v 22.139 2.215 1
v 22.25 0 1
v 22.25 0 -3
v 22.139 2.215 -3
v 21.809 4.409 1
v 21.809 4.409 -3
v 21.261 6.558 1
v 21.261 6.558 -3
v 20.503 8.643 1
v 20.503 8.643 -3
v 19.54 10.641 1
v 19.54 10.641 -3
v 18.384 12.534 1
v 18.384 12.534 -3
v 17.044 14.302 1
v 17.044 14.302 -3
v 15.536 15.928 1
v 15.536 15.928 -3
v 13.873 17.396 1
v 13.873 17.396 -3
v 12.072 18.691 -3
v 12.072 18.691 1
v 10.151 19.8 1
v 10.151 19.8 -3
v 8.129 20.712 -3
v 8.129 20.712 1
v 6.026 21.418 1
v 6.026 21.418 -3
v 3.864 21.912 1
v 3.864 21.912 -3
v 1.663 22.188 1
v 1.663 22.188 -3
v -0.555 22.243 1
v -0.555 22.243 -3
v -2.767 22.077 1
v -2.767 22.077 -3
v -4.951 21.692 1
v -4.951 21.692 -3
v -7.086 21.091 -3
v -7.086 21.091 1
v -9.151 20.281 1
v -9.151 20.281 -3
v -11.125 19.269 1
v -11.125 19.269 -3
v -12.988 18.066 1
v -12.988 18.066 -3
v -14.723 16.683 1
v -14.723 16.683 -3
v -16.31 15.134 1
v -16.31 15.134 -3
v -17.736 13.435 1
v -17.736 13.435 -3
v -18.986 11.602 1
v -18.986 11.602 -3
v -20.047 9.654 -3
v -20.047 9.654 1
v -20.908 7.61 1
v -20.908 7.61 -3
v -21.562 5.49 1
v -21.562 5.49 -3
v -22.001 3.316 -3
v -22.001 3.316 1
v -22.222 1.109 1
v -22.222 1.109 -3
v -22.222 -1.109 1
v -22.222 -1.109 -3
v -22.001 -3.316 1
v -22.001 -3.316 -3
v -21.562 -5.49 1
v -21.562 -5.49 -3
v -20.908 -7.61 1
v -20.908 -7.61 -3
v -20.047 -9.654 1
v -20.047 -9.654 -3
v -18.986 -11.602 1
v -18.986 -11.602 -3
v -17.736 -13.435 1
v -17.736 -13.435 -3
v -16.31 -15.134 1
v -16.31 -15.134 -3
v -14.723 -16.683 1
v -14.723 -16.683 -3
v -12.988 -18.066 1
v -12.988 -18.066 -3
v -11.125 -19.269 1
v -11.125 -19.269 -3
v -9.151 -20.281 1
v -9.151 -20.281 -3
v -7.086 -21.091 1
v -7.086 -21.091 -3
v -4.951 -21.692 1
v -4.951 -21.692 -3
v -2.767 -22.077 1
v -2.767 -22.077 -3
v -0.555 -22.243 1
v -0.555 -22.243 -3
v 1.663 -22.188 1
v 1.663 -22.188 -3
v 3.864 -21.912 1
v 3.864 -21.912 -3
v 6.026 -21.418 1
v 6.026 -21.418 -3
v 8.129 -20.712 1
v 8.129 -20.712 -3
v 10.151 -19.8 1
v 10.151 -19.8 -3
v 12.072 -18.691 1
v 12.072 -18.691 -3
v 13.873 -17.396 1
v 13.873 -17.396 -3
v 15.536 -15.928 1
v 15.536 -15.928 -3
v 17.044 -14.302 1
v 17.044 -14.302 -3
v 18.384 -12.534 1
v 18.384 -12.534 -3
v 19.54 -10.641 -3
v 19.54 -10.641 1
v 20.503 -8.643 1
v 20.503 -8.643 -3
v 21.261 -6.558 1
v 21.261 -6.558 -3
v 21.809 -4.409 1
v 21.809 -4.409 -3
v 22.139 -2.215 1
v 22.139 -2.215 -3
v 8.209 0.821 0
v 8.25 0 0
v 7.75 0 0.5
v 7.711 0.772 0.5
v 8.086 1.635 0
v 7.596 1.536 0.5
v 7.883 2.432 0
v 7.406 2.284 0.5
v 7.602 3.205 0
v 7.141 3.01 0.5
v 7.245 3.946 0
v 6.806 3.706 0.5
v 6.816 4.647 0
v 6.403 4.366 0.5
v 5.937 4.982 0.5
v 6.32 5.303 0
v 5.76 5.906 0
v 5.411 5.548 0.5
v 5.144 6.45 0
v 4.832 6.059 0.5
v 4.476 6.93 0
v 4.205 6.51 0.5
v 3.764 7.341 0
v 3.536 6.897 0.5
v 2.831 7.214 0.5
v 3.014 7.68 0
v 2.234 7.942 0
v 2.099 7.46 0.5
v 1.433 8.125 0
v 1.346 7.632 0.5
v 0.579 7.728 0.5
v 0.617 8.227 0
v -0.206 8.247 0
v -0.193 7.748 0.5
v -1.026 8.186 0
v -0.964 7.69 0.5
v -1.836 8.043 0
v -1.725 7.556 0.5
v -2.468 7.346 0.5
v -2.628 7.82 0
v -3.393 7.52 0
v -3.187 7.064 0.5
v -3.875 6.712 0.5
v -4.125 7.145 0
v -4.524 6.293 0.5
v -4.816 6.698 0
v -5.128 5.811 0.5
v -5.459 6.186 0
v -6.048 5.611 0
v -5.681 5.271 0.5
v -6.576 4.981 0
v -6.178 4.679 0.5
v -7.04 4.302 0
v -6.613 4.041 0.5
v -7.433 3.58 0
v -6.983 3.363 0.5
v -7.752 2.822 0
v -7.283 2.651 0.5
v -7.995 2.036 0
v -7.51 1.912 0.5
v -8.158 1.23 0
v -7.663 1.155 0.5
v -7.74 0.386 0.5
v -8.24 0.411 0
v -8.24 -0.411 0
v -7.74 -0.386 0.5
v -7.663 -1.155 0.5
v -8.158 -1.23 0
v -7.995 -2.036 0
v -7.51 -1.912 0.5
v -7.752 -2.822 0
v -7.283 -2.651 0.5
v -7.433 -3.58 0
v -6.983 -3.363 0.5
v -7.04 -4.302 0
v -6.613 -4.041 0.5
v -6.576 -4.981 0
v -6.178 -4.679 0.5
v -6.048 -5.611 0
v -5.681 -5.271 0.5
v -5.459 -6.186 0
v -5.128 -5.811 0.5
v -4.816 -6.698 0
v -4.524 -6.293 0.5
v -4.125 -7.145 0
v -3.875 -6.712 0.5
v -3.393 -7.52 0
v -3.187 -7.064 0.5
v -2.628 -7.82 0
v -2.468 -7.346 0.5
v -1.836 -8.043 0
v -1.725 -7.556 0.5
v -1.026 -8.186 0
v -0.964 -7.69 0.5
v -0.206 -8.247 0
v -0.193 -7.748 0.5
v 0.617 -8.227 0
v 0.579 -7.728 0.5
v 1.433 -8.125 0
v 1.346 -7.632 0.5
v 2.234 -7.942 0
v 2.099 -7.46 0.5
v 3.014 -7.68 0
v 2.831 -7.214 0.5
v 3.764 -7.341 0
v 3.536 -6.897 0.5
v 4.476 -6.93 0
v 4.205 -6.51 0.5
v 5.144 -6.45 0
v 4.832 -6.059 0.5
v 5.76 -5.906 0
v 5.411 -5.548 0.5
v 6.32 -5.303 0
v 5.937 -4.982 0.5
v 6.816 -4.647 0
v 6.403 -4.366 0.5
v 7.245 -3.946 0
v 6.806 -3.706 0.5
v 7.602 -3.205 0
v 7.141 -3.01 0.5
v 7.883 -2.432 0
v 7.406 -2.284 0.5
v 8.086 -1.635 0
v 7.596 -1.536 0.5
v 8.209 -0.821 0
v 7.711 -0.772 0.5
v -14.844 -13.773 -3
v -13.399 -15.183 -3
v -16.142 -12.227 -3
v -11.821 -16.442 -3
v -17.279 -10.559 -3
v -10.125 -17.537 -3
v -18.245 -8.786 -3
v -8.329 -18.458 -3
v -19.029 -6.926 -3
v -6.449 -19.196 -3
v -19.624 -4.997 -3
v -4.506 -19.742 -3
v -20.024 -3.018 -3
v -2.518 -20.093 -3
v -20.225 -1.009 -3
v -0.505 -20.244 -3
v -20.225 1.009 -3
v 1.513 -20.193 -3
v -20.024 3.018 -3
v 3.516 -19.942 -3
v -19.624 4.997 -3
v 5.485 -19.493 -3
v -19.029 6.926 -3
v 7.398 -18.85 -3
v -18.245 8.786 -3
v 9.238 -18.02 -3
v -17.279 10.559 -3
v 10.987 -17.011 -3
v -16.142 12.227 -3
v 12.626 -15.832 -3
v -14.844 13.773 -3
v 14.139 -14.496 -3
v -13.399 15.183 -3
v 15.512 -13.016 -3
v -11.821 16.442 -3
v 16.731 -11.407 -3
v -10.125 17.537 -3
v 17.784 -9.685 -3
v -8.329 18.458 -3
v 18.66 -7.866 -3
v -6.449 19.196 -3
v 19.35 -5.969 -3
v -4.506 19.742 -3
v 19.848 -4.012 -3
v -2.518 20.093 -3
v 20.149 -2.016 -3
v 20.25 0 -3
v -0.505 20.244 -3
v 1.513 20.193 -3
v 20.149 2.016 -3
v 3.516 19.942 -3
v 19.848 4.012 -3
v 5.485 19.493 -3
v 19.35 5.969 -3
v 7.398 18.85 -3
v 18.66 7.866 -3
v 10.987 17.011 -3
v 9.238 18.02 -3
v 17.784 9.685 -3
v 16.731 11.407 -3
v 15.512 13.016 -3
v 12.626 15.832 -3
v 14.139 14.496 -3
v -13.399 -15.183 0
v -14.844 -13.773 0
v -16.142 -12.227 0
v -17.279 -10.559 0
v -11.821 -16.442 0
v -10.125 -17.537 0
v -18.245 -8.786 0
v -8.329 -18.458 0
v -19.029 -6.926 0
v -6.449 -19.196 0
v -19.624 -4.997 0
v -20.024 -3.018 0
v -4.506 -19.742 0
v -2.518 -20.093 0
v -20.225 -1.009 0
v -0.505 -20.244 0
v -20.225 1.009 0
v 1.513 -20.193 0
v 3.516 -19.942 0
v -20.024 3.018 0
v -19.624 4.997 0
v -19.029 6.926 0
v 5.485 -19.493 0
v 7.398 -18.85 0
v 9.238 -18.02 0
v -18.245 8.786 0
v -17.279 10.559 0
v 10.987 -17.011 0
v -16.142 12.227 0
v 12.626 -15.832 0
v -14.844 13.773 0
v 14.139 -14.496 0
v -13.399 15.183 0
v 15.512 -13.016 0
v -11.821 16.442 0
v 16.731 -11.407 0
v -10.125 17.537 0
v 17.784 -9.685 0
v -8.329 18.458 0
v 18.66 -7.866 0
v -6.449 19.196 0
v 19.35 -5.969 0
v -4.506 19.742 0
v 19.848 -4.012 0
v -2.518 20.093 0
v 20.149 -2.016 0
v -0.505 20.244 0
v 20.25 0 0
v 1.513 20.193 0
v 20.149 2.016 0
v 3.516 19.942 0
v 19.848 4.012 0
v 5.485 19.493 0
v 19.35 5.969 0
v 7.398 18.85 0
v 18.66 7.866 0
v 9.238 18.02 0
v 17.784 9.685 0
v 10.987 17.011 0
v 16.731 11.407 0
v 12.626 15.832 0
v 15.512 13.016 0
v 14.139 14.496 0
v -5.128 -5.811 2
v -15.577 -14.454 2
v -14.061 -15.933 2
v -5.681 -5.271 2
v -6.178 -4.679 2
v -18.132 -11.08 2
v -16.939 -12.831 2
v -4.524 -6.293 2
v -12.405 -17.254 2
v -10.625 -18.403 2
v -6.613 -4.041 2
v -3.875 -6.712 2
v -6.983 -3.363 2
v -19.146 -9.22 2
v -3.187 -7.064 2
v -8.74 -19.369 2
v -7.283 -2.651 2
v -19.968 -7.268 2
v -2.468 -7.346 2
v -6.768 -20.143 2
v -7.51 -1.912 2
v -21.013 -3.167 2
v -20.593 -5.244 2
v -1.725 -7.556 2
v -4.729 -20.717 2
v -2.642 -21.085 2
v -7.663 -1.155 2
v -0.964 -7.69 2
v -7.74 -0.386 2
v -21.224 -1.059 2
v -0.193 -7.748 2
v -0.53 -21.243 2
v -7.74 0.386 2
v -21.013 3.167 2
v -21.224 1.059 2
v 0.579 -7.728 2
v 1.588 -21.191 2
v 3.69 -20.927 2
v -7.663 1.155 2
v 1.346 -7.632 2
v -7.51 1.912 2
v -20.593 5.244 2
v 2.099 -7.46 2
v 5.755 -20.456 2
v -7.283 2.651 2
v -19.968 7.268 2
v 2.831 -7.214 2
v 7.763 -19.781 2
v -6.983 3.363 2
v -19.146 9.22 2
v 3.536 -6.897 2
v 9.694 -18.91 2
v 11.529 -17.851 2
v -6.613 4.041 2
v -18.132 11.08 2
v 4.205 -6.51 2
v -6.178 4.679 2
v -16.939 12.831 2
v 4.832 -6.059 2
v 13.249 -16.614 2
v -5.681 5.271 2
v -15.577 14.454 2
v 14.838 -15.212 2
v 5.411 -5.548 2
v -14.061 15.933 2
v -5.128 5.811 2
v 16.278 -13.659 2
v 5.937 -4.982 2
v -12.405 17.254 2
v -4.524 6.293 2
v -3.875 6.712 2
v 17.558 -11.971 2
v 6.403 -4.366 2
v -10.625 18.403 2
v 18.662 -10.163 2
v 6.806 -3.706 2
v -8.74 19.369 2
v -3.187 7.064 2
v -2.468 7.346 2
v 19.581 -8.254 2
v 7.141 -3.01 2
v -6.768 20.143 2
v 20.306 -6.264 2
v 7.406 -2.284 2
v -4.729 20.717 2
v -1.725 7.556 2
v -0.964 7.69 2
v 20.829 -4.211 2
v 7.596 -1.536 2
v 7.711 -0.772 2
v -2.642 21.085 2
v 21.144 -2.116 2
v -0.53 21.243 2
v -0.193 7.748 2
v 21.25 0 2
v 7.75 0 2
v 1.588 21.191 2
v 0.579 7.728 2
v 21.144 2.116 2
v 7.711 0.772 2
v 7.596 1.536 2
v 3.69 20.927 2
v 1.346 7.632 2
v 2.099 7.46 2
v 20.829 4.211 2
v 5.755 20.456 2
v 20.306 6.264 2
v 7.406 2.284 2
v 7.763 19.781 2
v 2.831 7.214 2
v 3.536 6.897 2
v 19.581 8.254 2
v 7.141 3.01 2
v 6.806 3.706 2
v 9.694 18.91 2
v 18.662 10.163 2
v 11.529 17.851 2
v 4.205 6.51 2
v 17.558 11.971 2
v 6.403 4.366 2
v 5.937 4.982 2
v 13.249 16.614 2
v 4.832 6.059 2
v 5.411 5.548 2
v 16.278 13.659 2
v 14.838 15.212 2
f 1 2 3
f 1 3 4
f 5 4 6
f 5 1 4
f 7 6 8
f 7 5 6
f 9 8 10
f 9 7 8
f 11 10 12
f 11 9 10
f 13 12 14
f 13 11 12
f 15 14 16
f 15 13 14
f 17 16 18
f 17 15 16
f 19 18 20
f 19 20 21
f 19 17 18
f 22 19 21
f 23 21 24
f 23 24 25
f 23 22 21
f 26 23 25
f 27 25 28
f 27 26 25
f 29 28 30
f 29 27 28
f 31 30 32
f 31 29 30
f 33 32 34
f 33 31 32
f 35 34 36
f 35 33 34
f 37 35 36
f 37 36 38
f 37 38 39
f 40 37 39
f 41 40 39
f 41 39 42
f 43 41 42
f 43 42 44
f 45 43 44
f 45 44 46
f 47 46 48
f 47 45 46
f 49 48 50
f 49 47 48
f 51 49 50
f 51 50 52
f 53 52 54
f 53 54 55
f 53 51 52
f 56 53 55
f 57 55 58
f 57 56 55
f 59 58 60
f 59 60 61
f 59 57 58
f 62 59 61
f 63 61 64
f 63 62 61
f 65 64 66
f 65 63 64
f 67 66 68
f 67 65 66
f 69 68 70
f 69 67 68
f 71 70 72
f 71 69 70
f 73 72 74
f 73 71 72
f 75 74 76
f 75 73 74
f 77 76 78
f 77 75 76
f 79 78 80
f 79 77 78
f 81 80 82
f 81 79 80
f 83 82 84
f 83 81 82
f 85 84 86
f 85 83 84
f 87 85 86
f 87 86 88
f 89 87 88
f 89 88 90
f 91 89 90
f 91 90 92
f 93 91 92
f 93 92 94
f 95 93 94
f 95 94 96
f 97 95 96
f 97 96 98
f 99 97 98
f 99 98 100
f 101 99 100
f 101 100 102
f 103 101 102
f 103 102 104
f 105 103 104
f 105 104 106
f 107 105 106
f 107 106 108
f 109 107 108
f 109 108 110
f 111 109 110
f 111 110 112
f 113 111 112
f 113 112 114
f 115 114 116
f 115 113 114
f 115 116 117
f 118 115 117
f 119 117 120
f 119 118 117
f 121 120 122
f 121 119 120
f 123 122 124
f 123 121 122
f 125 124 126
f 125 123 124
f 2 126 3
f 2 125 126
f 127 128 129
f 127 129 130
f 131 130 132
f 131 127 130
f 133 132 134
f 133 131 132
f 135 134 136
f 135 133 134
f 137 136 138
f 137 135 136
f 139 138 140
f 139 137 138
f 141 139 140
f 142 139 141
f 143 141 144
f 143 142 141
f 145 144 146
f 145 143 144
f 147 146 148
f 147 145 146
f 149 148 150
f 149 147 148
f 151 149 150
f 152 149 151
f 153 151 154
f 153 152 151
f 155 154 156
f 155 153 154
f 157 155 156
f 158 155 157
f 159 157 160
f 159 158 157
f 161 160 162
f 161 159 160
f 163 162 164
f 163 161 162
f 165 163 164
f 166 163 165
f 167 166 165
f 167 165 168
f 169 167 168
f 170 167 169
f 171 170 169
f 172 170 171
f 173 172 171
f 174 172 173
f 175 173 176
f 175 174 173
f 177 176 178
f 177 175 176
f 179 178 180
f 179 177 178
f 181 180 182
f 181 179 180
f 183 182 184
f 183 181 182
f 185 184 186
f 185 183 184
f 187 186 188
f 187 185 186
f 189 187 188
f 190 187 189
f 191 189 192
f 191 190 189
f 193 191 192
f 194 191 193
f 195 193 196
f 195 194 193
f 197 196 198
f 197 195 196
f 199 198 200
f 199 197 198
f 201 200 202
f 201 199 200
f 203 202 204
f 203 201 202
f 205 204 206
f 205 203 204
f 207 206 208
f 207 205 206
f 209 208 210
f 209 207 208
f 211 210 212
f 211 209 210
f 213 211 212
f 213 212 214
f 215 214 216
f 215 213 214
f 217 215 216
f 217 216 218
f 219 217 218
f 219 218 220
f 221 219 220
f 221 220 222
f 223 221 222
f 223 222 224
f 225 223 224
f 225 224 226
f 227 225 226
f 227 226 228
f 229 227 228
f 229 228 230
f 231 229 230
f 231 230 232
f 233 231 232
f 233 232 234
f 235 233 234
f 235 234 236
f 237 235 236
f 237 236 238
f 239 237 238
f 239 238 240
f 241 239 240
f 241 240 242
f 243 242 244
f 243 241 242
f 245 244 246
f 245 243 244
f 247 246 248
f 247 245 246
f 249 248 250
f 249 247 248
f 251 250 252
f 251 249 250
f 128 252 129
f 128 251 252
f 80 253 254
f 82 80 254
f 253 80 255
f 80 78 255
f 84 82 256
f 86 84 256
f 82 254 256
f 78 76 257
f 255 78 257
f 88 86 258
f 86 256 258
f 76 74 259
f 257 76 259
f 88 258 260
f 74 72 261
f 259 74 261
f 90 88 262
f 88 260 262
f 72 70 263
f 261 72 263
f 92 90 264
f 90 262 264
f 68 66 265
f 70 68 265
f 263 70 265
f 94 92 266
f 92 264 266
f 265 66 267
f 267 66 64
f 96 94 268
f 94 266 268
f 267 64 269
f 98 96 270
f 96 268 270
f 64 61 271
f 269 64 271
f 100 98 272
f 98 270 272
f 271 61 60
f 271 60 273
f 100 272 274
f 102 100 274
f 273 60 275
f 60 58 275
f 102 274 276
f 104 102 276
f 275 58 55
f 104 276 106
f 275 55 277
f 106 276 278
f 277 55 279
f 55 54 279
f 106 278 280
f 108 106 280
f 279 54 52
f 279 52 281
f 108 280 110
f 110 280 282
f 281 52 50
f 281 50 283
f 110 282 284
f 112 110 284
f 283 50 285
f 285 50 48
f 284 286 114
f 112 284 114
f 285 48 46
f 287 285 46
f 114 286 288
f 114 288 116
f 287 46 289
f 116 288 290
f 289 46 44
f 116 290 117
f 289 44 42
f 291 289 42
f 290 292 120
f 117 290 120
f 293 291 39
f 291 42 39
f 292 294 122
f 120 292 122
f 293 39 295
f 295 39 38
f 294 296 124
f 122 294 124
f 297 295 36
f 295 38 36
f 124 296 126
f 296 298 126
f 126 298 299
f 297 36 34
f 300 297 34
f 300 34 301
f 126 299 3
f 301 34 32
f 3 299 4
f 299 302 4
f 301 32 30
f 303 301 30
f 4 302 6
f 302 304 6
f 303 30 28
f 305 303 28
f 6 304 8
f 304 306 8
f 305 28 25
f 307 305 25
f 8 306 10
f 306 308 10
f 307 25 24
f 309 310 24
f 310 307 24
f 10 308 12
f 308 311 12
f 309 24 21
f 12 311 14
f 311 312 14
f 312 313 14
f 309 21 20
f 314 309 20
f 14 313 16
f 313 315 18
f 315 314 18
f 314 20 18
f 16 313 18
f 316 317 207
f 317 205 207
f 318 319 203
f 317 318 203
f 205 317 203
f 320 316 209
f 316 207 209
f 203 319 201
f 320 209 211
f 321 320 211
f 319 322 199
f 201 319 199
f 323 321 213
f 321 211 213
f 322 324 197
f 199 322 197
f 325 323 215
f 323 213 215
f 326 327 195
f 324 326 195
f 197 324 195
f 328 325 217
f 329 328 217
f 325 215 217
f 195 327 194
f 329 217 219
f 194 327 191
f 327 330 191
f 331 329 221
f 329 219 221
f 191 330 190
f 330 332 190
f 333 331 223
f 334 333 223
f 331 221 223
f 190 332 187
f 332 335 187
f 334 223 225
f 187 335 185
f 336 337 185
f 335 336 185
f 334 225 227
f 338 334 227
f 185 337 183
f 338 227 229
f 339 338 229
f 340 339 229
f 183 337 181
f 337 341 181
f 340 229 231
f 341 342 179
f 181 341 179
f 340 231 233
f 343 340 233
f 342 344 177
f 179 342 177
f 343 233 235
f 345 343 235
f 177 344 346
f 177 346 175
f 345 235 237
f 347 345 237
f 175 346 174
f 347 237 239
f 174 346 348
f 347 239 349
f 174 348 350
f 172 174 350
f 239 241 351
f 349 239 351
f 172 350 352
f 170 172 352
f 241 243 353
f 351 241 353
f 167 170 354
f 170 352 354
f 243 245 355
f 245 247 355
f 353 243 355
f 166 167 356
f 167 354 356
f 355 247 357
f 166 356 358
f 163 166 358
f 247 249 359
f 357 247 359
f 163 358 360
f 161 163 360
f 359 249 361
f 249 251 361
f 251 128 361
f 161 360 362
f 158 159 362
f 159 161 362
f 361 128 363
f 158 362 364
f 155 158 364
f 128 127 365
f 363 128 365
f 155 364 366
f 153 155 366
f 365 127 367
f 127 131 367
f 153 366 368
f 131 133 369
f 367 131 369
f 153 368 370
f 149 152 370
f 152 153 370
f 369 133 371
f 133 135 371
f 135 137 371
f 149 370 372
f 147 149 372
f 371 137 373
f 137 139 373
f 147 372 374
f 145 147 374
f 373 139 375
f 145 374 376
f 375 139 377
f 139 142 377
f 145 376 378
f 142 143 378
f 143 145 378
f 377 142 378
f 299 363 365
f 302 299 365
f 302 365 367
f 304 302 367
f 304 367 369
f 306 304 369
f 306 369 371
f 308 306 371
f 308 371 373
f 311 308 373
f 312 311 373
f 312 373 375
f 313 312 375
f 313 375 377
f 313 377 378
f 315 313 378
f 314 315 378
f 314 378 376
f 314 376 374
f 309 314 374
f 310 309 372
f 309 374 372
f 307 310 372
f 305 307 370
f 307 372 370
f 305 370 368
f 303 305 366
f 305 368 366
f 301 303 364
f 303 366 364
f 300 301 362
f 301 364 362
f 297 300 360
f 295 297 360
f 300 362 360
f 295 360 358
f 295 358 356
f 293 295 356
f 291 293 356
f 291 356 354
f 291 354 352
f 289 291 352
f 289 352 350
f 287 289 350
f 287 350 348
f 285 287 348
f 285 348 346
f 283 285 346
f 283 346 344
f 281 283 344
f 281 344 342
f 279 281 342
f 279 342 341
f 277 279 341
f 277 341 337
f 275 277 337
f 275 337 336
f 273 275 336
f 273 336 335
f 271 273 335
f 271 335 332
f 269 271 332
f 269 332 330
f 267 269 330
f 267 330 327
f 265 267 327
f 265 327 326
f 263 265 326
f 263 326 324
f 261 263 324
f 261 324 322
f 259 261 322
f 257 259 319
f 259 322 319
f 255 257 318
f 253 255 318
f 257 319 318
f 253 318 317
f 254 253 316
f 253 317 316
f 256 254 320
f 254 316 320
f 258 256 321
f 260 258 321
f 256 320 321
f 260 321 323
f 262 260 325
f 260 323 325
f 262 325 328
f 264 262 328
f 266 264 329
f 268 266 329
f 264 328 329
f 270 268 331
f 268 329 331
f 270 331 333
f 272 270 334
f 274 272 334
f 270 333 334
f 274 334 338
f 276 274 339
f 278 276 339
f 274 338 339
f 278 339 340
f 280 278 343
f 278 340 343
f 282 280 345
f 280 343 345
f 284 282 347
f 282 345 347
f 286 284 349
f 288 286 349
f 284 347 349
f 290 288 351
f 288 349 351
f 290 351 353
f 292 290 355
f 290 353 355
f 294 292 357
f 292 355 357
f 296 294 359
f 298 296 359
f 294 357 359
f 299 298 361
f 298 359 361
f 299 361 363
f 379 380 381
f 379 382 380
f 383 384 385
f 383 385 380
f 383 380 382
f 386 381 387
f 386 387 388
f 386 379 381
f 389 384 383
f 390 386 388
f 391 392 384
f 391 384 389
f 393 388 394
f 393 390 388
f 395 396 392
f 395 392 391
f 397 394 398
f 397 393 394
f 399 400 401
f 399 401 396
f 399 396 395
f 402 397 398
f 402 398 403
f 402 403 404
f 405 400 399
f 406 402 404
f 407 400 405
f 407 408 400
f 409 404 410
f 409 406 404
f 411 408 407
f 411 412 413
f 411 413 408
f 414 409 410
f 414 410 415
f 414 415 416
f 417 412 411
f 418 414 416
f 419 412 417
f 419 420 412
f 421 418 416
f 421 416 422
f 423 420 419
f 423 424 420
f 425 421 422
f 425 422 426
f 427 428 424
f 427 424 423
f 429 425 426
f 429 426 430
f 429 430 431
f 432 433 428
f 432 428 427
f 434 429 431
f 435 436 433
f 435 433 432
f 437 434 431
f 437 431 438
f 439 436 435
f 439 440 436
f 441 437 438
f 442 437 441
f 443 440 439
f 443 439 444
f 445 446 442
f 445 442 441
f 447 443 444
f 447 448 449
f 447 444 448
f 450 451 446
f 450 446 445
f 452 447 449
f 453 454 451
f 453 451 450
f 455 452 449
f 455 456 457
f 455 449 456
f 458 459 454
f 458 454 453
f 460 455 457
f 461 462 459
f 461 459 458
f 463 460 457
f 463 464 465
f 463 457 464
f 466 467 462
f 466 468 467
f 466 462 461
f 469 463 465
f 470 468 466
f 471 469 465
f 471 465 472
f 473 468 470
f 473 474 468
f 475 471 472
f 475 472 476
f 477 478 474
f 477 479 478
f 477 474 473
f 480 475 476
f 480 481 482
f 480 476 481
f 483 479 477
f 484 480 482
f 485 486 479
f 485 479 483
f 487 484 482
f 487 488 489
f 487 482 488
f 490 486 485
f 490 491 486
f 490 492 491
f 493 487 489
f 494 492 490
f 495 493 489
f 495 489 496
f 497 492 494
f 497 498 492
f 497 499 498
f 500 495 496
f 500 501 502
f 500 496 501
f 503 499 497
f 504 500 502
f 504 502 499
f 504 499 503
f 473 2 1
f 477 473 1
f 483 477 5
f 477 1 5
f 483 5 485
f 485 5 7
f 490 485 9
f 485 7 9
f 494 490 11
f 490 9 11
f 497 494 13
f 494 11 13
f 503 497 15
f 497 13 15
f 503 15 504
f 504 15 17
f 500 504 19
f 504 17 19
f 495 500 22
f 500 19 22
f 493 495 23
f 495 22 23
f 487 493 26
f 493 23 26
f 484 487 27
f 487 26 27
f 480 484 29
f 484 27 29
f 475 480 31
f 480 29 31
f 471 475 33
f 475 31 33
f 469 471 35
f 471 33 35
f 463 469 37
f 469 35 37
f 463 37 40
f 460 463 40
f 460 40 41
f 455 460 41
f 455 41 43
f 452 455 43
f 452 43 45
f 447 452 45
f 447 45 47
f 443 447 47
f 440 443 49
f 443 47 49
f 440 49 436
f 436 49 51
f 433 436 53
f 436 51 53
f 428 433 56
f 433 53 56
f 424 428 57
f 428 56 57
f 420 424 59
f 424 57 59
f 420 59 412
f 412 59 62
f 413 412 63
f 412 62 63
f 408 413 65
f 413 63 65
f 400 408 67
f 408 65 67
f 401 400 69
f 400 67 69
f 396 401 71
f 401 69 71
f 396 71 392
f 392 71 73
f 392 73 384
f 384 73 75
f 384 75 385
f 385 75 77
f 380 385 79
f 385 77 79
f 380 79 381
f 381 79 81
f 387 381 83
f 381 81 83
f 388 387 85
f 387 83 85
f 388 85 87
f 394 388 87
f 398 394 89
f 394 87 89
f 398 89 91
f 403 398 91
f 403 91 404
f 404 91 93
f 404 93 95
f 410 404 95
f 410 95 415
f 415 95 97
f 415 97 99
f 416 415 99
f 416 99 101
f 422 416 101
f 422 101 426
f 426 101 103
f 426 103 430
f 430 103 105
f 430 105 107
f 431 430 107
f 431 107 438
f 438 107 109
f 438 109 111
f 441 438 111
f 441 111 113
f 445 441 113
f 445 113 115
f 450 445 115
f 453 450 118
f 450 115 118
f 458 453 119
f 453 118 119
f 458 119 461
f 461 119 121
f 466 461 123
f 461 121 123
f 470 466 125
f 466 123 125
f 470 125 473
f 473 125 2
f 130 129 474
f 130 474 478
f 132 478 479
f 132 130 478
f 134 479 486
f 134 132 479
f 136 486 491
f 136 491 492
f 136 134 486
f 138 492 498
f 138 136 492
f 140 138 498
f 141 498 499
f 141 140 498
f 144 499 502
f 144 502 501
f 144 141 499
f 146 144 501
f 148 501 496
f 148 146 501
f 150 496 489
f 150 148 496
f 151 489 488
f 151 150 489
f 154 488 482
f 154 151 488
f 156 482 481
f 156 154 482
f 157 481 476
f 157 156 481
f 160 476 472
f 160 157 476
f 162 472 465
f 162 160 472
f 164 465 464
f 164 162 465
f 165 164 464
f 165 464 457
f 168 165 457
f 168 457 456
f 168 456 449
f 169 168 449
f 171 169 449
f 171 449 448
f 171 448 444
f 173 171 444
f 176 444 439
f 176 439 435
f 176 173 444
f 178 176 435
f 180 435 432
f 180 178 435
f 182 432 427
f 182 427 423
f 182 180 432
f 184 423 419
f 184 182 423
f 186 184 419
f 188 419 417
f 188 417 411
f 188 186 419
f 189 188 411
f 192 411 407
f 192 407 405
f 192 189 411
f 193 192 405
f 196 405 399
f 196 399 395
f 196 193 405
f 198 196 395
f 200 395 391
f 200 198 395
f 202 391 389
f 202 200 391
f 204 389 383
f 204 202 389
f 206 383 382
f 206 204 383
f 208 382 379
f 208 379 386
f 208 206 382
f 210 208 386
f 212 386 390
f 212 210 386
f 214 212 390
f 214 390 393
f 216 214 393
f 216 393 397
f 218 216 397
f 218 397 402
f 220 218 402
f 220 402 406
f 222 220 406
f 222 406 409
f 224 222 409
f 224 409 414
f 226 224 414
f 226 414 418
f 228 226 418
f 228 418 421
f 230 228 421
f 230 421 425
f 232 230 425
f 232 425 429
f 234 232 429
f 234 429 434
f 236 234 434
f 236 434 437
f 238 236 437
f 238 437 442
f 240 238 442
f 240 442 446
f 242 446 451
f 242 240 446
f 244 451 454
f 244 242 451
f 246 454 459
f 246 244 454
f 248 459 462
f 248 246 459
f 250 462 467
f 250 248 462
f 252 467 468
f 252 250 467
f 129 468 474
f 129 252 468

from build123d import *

# Parameters (mm, degrees)
F0_R     = 20.25
F0_R_2   = 7.75
F1_DEPTH = 2
F2_R     = 22.25
F2_R_2   = 20.25
F3_DEPTH = 5
F4_SIZE  = 0.5
F5_SIZE  = 1


with BuildPart() as f1:
    # F0 (on Top) → F1 (new body)
    with BuildSketch(Plane.XY):
        Circle(F0_R)
        Circle(F0_R_2, mode=Mode.SUBTRACT)
    extrude(amount=F1_DEPTH)

    # F2 (on face) → F3 (join)
    with BuildSketch(Plane.XY.offset(2)):
        Circle(F2_R)
        Circle(F2_R_2, mode=Mode.SUBTRACT)
    extrude(amount=-F3_DEPTH)

    # F4
    f4_edges = [f1.edges().sort_by_distance(p)[0] for p in [
        (-7.75, 0, 0),
    ]]
    chamfer(f4_edges, length=F4_SIZE)

    # F5
    f5_edges = [f1.edges().sort_by_distance(p)[0] for p in [
        (-22.25, 0, 2),
    ]]
    chamfer(f5_edges, length=F5_SIZE)


solid = f1.part
